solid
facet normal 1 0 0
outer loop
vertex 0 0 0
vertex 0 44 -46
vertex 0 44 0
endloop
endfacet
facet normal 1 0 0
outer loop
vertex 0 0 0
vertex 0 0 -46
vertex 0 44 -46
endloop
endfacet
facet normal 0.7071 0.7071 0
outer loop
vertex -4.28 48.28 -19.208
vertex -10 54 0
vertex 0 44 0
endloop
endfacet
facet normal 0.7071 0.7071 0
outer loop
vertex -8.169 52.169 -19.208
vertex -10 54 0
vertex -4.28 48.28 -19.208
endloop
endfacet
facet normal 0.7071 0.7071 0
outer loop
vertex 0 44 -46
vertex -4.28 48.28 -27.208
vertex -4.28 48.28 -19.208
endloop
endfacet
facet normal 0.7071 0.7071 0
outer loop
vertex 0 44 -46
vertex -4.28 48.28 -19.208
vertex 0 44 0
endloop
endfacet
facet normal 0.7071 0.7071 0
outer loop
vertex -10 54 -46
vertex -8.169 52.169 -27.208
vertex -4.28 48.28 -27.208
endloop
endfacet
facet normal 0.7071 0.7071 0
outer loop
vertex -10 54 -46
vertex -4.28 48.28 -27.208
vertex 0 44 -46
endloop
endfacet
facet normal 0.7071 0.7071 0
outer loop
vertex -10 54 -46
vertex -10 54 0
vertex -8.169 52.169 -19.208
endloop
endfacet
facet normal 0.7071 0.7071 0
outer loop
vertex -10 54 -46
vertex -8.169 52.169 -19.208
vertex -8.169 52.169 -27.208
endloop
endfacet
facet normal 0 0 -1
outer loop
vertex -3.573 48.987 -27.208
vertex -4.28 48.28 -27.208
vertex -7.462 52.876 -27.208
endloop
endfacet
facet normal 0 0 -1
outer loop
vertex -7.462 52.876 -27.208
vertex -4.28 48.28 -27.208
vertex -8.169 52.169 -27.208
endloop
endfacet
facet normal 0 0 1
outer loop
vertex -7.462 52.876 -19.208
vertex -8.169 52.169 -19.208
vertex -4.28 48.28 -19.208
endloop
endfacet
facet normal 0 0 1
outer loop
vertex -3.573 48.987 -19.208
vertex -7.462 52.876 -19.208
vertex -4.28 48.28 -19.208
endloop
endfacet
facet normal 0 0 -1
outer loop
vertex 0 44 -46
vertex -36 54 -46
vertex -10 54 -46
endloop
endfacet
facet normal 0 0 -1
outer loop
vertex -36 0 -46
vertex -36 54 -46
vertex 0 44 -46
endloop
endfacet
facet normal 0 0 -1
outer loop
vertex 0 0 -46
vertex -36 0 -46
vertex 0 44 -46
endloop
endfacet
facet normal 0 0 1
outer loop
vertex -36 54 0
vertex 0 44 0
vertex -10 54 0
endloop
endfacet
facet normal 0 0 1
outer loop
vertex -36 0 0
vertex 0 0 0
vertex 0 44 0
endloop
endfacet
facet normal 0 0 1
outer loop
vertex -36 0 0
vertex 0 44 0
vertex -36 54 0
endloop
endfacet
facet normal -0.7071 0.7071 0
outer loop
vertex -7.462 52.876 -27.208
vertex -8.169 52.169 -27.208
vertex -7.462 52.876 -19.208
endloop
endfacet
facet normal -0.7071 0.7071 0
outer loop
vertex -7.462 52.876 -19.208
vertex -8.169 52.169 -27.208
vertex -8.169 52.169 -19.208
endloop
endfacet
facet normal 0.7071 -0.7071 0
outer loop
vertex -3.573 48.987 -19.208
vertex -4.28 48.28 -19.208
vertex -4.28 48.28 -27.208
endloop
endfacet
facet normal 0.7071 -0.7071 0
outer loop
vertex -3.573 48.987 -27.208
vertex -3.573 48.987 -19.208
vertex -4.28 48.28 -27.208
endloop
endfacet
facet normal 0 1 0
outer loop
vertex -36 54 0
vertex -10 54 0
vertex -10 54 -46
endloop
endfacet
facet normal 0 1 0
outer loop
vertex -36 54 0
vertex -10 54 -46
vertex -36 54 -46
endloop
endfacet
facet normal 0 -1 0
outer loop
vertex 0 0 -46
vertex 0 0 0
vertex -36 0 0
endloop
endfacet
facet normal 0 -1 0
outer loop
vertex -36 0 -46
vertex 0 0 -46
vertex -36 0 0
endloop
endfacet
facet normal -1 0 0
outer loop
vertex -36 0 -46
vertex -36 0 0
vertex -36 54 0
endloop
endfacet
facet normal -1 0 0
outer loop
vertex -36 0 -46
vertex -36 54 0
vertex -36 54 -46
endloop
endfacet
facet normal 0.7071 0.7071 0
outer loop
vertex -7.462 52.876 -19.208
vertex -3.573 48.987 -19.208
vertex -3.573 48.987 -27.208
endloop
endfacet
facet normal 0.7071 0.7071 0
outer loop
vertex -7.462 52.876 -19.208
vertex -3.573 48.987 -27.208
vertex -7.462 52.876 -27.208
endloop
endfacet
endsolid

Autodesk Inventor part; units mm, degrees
ref_plane "YZ Plane" through (0, 0, 0) normal (1, 0, 0) x (0, 1, 0)
ref_plane "XZ Plane" through (0, 0, 0) normal (0, 1, 0) x (-1, 0, 0)
ref_plane "XY Plane" through (0, 0, 0) normal (0, 0, 1) x (1, 0, 0)
sketch "Sketch1" plane through (0, 0, 0) normal (0, 1, 0) x (-1, 0, 0)
  line L0 (0, 0) -> (36, 0)
  line L1 (36, 0) -> (36, -46)
  line L2 (36, -46) -> (0, -46)
  line L3 (0, -46) -> (0, 0)
  dimension "d0" = 46
  dimension "d1" = 36
extrude "Extrusion1" add sketch "Sketch1" along normal blind 54
chamfer "Chamfer1" distance 10 angle 45 1 edges at (0, 54, -23)
sketch "Sketch2" plane through (-36, 0, 0) normal (0, 0, 1) x (1, 0, 0)
  point P0 (36, 0)
sketch "Sketch3" plane through (-10, 54, -46) normal (0.7071, 0.7071, 0) x (-0.7071, 0.7071, 0)
  line L0 (-2.5891, 26.7922) -> (-8.0891, 26.7922)
  line L1 (-8.0891, 26.7922) -> (-8.0891, 18.7922)
  line L2 (-8.0891, 18.7922) -> (-2.5891, 18.7922)
  line L3 (-2.5891, 18.7922) -> (-2.5891, 26.7922)
  line L4 (-19.799, 46) -> (18.3848, 46) projected
  point P0 (-45.2548, 46)
  dimension "d7" = 8
  dimension "d8" = 5.5
extrude "Extrusion2" add sketch "Sketch3" along normal blind 1
sketch "Sketch4" plane through (-10, 54, -46) normal (0.7071, 0.7071, 0) x (-0.7071, 0.7071, 0)
  point P0 (-45.2548, 46)
sketch "Sketch5" plane through (-36, 0, 0) normal (0, 0, 1) x (1, 0, 0)
  point P0 (36, 0)
properties part number "Ventilator"
